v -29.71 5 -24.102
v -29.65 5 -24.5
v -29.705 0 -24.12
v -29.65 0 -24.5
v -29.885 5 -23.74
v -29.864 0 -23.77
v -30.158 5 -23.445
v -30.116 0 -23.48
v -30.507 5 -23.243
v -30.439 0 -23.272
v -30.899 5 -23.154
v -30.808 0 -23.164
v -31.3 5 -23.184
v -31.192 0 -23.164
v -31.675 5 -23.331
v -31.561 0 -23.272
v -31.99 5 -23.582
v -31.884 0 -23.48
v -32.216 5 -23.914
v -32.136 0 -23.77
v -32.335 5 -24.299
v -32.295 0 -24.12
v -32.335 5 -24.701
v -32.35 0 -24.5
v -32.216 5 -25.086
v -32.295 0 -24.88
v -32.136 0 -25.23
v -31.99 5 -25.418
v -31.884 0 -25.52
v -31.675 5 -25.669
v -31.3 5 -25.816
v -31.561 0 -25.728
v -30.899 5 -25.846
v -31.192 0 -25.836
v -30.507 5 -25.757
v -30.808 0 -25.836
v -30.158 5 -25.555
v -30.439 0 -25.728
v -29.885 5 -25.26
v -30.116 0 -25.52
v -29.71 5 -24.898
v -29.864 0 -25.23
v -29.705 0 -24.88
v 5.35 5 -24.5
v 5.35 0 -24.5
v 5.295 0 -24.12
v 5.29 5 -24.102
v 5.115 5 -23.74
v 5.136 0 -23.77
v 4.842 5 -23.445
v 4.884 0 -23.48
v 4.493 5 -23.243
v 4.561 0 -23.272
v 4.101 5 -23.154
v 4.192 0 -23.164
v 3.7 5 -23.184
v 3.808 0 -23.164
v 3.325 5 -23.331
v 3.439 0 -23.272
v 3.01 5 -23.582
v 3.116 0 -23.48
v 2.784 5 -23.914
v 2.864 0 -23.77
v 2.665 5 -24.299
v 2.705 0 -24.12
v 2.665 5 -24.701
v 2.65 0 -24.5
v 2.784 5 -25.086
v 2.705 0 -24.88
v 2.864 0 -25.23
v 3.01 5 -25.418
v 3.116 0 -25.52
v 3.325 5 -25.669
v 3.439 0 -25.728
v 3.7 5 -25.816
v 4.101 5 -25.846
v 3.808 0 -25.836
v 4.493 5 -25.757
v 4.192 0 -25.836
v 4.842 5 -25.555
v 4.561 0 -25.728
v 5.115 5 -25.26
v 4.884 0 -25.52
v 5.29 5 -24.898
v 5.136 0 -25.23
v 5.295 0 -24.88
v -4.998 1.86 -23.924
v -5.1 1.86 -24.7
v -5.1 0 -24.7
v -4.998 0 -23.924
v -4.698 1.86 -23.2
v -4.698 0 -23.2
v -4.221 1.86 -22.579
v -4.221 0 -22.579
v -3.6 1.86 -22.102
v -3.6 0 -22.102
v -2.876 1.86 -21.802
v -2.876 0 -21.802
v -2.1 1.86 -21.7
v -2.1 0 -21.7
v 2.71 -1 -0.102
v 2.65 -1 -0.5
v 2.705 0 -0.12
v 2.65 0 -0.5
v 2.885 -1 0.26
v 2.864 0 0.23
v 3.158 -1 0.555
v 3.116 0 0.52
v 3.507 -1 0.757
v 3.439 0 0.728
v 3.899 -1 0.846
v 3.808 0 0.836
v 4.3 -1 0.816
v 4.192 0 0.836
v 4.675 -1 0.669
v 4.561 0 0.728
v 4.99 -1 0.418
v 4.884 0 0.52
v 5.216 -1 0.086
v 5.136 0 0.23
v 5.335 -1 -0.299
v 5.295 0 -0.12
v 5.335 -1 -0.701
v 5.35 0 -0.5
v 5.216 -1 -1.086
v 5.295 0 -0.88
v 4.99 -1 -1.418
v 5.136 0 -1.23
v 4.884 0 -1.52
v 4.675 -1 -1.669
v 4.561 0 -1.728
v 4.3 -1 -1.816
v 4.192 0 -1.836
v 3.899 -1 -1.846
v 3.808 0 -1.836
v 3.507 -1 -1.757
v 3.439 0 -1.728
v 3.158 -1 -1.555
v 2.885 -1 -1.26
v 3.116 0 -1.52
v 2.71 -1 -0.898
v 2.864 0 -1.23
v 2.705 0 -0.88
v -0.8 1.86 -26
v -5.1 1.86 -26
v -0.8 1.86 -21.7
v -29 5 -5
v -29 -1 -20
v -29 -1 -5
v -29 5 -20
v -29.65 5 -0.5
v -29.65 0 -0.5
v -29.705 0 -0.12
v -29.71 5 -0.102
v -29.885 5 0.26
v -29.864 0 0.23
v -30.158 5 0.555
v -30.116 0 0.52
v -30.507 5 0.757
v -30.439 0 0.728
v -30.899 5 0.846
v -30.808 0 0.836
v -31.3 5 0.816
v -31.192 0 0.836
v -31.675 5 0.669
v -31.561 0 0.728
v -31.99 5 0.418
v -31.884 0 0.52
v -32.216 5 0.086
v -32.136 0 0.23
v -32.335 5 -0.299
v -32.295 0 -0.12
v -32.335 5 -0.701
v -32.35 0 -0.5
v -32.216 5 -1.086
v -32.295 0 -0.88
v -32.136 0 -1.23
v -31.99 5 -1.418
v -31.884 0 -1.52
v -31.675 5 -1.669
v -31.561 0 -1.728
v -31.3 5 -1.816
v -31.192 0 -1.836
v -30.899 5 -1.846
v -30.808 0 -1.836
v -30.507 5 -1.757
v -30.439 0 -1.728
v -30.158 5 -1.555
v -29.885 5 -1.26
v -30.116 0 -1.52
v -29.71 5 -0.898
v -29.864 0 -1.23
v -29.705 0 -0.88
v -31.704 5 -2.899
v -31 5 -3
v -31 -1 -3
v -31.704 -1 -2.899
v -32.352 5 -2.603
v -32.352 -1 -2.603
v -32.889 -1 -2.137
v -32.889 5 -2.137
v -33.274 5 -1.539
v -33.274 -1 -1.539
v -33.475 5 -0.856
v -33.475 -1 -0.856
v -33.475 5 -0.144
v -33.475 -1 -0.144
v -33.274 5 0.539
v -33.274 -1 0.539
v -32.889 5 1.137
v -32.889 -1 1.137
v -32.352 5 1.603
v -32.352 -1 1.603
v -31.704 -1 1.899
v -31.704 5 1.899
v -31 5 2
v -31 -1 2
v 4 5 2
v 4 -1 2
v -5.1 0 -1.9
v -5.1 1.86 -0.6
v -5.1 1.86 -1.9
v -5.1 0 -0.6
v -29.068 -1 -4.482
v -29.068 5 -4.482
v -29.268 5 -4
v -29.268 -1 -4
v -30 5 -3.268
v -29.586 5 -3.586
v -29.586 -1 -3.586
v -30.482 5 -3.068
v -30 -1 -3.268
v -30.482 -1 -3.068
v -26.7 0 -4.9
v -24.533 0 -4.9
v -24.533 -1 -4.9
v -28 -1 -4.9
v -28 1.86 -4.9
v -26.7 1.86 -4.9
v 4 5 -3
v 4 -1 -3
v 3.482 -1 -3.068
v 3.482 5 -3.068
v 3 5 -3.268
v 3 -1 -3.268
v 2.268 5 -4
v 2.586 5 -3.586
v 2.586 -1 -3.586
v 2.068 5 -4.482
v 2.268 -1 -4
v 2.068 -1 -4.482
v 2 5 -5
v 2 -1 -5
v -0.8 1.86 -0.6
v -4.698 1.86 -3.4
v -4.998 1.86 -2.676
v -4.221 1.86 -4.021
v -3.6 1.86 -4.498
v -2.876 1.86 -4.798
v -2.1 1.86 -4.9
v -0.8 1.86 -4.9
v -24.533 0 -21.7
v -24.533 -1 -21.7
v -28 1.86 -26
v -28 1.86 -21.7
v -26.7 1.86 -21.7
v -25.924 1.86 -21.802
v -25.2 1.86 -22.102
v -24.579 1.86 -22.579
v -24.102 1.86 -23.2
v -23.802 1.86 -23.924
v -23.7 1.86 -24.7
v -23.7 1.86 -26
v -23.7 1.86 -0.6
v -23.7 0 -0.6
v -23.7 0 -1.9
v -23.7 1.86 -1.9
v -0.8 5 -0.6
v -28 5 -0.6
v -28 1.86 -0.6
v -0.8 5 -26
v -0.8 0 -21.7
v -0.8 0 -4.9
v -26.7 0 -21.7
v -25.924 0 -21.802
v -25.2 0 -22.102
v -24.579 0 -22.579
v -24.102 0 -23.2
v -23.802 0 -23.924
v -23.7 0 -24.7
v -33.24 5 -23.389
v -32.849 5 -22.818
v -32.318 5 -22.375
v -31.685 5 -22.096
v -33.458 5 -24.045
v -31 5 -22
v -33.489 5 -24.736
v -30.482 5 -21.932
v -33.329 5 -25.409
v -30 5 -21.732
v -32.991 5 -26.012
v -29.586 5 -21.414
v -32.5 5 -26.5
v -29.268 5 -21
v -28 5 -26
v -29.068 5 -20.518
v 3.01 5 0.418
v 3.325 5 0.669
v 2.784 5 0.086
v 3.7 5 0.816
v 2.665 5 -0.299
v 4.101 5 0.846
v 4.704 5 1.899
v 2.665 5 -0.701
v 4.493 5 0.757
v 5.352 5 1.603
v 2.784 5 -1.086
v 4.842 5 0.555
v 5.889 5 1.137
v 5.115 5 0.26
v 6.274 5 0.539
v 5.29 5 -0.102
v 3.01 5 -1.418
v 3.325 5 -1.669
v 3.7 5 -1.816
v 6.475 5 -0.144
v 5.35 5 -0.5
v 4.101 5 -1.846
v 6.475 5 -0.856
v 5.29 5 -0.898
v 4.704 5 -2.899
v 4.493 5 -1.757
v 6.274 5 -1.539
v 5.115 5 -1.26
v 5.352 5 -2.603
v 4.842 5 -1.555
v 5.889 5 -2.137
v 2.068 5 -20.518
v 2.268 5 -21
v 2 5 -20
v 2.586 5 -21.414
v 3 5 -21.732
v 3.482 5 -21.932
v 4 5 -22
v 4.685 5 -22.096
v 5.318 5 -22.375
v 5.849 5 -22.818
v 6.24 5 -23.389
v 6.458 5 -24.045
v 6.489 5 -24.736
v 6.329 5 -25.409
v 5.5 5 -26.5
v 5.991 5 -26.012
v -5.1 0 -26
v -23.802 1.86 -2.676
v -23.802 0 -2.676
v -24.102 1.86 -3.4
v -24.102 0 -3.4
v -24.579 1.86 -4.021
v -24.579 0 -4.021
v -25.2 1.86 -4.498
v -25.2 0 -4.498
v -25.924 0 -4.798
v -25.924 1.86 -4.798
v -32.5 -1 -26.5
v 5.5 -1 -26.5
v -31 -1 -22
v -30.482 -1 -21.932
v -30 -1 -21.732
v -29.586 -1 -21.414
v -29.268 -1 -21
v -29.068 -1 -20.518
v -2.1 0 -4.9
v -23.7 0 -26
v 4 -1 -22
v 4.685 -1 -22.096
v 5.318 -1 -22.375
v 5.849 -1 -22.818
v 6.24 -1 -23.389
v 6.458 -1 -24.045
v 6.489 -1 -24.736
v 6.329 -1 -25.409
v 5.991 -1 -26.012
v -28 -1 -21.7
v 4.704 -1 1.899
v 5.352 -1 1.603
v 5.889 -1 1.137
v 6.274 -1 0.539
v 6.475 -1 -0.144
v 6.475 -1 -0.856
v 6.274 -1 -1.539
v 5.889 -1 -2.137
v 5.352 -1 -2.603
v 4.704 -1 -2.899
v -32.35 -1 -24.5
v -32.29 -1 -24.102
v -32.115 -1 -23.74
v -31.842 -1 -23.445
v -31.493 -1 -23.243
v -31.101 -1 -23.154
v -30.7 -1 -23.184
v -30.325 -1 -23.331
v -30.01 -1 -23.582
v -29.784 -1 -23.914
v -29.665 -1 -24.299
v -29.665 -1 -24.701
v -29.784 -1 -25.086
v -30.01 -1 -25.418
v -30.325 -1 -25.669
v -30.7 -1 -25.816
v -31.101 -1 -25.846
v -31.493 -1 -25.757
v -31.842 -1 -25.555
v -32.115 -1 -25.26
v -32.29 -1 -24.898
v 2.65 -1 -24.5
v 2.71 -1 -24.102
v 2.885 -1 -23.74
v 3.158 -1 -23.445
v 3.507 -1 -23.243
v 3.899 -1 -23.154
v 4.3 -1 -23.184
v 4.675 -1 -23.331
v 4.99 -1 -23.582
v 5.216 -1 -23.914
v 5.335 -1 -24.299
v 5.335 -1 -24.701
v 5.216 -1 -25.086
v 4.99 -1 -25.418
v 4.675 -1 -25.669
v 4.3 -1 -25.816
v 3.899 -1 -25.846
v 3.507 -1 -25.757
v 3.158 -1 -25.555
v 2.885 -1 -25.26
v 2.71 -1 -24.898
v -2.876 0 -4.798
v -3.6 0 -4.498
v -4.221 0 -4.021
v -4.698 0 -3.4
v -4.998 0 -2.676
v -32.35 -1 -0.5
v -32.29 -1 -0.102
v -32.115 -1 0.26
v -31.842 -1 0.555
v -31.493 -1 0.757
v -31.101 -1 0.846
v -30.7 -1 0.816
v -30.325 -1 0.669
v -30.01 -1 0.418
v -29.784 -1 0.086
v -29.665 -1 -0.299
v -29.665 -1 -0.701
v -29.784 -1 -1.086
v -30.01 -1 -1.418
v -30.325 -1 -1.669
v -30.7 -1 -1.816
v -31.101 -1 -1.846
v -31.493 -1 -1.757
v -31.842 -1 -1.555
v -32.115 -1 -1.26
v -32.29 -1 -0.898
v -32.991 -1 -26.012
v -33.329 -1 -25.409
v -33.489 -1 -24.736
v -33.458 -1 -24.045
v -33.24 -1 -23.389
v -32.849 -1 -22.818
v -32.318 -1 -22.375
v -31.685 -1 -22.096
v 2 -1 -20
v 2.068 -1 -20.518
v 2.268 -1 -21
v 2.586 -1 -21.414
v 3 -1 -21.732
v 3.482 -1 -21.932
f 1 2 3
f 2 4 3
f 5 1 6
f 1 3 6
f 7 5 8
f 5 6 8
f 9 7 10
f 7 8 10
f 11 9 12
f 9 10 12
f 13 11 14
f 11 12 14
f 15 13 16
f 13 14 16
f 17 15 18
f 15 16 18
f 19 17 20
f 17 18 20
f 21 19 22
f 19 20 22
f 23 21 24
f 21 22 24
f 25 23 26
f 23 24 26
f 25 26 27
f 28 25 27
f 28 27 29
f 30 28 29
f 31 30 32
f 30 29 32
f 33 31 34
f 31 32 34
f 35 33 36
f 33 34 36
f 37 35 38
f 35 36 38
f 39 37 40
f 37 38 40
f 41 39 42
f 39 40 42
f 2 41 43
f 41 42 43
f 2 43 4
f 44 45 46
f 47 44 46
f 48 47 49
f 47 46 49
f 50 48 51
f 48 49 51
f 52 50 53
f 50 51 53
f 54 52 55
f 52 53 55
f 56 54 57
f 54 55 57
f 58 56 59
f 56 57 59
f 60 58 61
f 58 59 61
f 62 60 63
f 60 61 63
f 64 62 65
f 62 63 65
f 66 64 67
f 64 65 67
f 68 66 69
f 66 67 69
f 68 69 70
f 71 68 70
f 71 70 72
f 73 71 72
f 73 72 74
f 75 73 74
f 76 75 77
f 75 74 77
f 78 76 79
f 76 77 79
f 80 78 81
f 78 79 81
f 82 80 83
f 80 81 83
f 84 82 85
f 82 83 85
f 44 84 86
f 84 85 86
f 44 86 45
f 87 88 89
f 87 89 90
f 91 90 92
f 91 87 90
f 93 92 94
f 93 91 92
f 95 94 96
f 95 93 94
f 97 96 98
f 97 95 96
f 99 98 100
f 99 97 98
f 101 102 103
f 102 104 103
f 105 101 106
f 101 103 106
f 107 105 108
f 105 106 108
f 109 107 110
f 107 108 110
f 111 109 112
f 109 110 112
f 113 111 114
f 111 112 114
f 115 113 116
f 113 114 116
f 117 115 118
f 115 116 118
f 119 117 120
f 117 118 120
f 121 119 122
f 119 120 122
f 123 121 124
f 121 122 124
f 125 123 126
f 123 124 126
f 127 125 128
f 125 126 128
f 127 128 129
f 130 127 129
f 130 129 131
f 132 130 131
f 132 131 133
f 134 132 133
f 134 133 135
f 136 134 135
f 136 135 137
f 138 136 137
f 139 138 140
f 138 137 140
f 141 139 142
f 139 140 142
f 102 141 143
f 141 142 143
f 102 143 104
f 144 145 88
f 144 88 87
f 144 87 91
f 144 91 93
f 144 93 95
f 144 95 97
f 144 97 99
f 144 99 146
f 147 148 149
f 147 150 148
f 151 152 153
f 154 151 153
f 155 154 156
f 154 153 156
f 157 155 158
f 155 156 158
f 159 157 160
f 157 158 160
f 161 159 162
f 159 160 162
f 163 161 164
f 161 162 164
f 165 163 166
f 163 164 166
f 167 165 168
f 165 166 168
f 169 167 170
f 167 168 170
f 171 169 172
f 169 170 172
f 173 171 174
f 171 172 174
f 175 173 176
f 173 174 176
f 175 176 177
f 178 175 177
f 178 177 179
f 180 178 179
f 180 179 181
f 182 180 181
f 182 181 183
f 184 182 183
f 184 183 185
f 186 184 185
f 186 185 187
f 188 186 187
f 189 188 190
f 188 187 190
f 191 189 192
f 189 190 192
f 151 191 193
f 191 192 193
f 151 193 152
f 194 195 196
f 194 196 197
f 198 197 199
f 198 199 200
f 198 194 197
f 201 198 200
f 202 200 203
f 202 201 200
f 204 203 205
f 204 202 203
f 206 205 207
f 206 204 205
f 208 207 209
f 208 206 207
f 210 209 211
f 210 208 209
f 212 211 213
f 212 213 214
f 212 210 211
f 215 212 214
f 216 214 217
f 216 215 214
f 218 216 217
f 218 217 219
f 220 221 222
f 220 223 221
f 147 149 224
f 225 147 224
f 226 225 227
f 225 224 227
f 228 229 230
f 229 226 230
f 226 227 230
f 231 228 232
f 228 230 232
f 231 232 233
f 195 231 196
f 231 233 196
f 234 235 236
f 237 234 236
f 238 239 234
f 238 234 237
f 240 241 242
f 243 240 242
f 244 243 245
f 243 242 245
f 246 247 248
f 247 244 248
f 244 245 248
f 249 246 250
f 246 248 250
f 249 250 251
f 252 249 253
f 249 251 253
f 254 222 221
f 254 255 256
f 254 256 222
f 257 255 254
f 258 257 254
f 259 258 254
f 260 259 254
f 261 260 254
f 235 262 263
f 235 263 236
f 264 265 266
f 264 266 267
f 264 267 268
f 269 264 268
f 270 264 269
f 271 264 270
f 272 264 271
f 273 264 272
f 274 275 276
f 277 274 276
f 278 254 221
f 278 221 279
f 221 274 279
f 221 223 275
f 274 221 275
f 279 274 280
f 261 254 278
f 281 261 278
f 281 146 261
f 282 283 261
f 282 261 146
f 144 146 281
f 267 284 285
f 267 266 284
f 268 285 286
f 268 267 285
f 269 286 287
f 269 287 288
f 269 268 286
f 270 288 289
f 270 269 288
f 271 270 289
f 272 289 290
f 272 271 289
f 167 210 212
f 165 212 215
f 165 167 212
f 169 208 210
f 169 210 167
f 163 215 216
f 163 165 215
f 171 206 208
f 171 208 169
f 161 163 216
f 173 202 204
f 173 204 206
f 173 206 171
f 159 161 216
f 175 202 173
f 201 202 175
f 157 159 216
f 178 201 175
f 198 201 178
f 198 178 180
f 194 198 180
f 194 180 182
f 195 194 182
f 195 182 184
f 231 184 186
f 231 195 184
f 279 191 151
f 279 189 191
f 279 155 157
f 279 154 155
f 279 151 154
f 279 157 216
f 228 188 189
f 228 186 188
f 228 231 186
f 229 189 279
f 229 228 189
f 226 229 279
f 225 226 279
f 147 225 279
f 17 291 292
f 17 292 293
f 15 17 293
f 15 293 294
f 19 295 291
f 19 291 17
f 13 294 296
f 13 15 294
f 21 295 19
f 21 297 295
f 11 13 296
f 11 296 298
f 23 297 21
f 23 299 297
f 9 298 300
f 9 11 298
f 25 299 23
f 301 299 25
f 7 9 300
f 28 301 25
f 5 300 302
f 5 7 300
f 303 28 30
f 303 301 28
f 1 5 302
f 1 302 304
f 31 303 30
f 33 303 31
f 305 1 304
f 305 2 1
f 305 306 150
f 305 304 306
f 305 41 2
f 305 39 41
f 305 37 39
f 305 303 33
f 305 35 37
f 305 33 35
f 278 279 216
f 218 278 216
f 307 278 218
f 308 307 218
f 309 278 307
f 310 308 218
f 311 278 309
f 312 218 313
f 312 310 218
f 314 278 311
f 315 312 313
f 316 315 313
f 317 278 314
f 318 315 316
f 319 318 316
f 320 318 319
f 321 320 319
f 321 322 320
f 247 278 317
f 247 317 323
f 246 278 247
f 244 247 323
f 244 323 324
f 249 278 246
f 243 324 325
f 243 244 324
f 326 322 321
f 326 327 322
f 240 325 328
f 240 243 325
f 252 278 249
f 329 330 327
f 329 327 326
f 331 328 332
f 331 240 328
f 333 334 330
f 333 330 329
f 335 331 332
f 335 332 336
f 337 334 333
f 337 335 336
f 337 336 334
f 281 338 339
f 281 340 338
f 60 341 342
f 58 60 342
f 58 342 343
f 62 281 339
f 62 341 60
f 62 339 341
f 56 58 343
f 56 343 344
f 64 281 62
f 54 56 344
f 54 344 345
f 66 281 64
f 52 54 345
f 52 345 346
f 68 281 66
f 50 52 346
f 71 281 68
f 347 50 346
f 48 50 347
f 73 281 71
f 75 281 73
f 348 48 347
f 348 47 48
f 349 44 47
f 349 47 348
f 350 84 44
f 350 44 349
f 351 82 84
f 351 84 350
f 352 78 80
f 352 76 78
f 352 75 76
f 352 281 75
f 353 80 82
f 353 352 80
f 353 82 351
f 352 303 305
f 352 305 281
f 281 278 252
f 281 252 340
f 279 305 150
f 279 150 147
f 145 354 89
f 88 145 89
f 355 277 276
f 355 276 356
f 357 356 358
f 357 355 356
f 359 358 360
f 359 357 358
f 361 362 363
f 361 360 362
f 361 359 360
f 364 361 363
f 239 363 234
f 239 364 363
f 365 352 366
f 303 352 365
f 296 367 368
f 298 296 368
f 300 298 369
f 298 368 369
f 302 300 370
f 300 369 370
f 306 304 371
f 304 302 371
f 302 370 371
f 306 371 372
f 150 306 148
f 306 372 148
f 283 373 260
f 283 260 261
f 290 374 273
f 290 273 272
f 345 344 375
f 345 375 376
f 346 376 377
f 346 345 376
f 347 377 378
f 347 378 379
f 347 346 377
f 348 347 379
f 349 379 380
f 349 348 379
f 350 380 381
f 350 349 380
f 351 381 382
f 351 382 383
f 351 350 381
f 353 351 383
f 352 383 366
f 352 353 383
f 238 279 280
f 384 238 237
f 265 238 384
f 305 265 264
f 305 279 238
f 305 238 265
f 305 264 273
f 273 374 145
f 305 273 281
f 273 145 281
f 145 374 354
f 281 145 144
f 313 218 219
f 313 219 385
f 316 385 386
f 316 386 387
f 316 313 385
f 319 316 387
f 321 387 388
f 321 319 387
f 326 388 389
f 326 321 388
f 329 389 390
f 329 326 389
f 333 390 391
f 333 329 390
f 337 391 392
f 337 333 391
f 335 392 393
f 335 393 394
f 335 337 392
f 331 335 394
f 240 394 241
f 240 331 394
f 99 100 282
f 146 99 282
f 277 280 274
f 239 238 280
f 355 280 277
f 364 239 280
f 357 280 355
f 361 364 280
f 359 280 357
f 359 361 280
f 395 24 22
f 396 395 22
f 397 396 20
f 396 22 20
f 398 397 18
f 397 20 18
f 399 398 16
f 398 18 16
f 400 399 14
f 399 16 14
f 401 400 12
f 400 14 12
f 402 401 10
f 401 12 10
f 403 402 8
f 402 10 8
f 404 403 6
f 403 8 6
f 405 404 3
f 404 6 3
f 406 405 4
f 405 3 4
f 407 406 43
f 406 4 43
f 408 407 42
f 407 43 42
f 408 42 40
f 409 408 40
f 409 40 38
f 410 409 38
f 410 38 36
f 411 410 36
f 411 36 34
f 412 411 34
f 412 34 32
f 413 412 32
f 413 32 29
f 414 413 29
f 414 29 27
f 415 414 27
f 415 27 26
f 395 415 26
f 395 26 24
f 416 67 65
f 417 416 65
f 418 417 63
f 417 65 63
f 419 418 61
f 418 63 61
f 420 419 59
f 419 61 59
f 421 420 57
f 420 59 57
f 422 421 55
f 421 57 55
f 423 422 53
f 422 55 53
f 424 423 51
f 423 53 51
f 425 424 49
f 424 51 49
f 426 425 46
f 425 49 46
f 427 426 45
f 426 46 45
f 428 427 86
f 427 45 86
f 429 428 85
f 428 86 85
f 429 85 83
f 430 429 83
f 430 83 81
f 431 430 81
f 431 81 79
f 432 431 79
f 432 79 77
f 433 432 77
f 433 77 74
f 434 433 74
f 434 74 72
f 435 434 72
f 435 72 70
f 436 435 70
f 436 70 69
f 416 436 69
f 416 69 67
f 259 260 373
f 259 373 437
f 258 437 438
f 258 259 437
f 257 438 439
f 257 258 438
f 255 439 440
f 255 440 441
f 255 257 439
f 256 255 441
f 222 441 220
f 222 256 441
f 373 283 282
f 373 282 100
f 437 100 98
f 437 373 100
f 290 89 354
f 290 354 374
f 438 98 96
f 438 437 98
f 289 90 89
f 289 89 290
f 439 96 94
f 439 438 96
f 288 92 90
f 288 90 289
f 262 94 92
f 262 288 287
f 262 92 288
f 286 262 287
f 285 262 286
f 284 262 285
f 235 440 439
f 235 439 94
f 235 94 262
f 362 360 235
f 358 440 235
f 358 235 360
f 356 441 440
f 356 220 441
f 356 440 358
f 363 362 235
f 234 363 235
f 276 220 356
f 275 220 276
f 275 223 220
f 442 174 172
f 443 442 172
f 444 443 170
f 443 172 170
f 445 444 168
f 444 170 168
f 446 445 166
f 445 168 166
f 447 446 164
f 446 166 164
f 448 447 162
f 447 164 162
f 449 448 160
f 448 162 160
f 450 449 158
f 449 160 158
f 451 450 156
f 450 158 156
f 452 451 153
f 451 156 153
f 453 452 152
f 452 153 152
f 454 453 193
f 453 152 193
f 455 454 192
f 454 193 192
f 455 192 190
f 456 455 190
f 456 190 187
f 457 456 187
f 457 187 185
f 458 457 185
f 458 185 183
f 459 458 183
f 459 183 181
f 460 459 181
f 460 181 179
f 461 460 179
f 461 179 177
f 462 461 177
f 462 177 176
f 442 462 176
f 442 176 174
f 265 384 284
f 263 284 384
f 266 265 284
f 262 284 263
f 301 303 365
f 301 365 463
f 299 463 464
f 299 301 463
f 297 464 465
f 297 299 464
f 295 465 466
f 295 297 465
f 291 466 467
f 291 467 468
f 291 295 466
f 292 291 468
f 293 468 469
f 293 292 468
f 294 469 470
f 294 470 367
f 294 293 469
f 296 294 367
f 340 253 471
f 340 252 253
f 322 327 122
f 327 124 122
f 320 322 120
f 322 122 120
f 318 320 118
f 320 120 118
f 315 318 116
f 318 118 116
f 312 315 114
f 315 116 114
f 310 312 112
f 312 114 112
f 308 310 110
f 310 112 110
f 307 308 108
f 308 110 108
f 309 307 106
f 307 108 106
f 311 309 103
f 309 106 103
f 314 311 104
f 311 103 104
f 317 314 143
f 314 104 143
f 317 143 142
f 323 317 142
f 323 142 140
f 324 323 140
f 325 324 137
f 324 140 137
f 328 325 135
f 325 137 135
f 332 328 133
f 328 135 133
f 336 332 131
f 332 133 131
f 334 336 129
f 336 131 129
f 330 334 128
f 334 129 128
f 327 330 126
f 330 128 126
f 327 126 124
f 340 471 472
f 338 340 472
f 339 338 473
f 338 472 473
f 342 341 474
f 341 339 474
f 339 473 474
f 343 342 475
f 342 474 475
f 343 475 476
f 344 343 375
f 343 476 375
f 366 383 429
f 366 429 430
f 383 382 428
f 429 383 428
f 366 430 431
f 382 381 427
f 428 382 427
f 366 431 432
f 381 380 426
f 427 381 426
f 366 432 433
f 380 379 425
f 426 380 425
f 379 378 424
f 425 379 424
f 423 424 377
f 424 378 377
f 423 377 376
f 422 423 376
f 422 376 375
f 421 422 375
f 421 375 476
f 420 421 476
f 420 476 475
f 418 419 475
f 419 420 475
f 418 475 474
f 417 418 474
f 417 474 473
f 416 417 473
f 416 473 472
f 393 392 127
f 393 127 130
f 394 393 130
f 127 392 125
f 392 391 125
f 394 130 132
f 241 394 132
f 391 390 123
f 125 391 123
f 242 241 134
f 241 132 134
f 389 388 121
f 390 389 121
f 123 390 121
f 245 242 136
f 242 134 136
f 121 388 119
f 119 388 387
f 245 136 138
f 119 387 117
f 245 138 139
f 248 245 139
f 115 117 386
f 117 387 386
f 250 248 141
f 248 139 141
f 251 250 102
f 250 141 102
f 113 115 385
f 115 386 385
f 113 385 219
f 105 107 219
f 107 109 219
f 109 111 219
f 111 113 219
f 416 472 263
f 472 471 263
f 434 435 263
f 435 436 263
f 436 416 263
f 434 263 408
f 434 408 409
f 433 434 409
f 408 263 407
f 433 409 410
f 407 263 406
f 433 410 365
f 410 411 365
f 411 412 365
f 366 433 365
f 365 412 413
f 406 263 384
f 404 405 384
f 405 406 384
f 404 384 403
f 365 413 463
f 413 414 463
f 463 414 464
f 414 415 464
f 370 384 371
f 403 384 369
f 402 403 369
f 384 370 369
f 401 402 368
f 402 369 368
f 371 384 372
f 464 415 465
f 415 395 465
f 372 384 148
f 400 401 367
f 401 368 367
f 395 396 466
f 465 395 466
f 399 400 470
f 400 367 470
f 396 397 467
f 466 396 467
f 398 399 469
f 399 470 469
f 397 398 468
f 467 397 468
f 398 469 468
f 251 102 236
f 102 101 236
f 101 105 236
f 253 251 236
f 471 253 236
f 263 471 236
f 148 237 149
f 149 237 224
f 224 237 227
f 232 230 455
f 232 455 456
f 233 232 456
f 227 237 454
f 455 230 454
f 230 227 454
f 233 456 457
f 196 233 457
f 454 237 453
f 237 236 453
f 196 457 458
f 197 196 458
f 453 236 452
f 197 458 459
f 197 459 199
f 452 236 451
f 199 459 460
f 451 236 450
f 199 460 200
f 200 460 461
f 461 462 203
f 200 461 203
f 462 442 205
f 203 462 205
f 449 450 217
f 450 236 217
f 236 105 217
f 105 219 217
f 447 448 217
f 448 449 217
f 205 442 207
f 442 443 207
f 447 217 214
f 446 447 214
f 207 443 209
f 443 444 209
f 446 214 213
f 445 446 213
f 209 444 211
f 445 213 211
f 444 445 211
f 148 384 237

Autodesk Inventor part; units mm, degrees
ref_plane "YZ Plane" through (0, 0, 0) normal (1, 0, 0) x (0, 1, 0)
ref_plane "XZ Plane" through (0, 0, 0) normal (0, 1, 0) x (-1, 0, 0)
ref_plane "XY Plane" through (0, 0, 0) normal (0, 0, 1) x (1, 0, 0)
sketch "Sketch1" plane through (0, 0, 0) normal (0, 1, 0) x (-1, 0, 0)
  line L0 (0, 0) -> (27, 0) construction
  line L1 (27, 0) -> (27, -25) construction
  line L2 (27, -25) -> (0, -25) construction
  line L3 (0, -25) -> (0, 0) construction
  line L4 (31, 2) -> (-4, 2)
  line L5 (-4, -27) -> (31, -27)
  line L6 (29, -22) -> (29, -3)
  line L7 (28, -4) -> (23.5, -4)
  line L8 (23.5, -4) -> (23.5, -21)
  line L9 (23.5, -21) -> (28, -21)
  line L10 (28, -21) -> (28, -4)
  arc A0 (31, -3) -> (31, 2) centre (31, -0.5) ccw
  arc A1 (31, -27) -> (31, -22) centre (31, -24.5) ccw
  arc A2 (-4, 2) -> (-4, -3) centre (-4, -0.5) ccw
  arc A3 (-4, -22) -> (-4, -27) centre (-4, -24.5) ccw
  line L11 (31, -3) -> (29, -3)
  line L12 (31, -22) -> (29, -22)
  line L13 (-4, -3) -> (-2, -3)
  line L14 (-4, -22) -> (-2, -22)
  line L15 (-2, -3) -> (-2, -22)
  circle A4 centre (31, -0.5) radius 1.35
  circle A5 centre (31, -24.5) radius 1.35
  circle A6 centre (-4, -0.5) radius 1.35
  circle A7 centre (-4, -24.5) radius 1.35
  point P0 (29, 2)
  point P1 (-2, -27)
  point P2 (-2, 2)
  point P3 (29, -27)
  dimension "d0" = 27
  dimension "d1" = 25
  dimension "d12" = 2
  dimension "d13" = 2
  dimension "d14" = 2
  dimension "d18" = 1
  dimension "d19" = 3.5
  dimension "d20" = 6
  dimension "d21" = 6
  dimension "d22" = 5
  dimension "d23" = 2.5
  dimension "d24" = 2
  dimension "d25" = 2.5
  dimension "d26" = 2
  dimension "d27" = 5
  dimension "d28" = 5
  dimension "d29" = 5
  dimension "d32" = 2.5
  dimension "d33" = 2.5
  dimension "d34" = 2.7
  dimension "d35" = 2.7
  dimension "d36" = 2.7
  dimension "d37" = 2.7
extrude "Extrusion1" add sketch "Sketch1" against normal blind 1
sketch "Sketch2" plane through (0, 0, 0) normal (0, 1, 0) x (1, 0, 0)
  line L0 (-31, -2) -> (4, -2) projected
  arc A0 (4, -2) -> (4, 3) centre (4, 0.5) ccw projected
  line L1 (4, 3) -> (2, 3) projected
  line L2 (2, 3) -> (2, 22) projected
  line L3 (2, 22) -> (4, 22) projected
  arc A1 (4, 22) -> (4, 27) centre (4, 24.5) ccw projected
  line L4 (4, 27) -> (-31, 27) projected
  arc A2 (-31, 27) -> (-31, 22) centre (-31, 24.5) ccw projected
  line L5 (-31, 22) -> (-29, 22) projected
  line L6 (-29, 22) -> (-29, 3) projected
  line L7 (-29, 3) -> (-31, 3) projected
  arc A3 (-31, 3) -> (-31, -2) centre (-31, 0.5) ccw projected
  circle A4 centre (4, 24.5) radius 1.35 projected
  circle A5 centre (4, 0.5) radius 1.35 projected
  circle A6 centre (-31, 24.5) radius 1.35 projected
  circle A7 centre (-31, 0.5) radius 1.35 projected
  line L8 (-28, 4) -> (-28, 21) projected
  line L9 (-28, 21) -> (-23.5, 21) projected
  line L10 (-23.5, 21) -> (-23.5, 4) projected
  line L11 (-23.5, 4) -> (-28, 4) projected
  line L12 (-28, 26) -> (1, 26)
  line L13 (1, 26) -> (1, -1)
  line L14 (1, -1) -> (-28, -1)
  line L15 (-28, -1) -> (-28, 26)
  point P0 (0, 0)
  dimension "d38" = 1
  dimension "d39" = 1
  dimension "d40" = 1
  dimension "d41" = 1
extrude "Extrusion2" add sketch "Sketch2" along normal blind 5
fillet "Fillet1" radius 2 4 edges at (2, 2, -3) (2, 2, -22) (-29, 2, -22) (-29, 2, -3)
sketch "Sketch4" plane through (0, 5, 0) normal (0, 1, 0) x (1, 0, 0)
  line L0 (-36.8851, 35.5263) -> (12.4576, 35.5263)
  line L1 (12.4576, 35.5263) -> (12.4576, 26.5)
  line L2 (12.4576, 26.5) -> (-36.8851, 26.5)
  line L3 (-36.8851, 26.5) -> (-36.8851, 35.5263)
  line L4 (4, 27) -> (-31, 27) projected
  point P0 (0, 0)
  dimension "d47" = 0.5
extrude "Extrusion3" cut sketch "Sketch4" against normal blind 10
sketch "Sketch5" plane through (0, 0, 0) normal (0, 1, 0) x (1, 0, 0)
  line L0 (1, -1) -> (-28, -1) projected
  line L1 (-28, -1) -> (1, -1)
  line L2 (1, -1) -> (1, 0.6)
  line L3 (1, 0.6) -> (-28, 0.6)
  line L4 (-28, 0.6) -> (-28, -1)
  line L5 (1, 26) -> (1, -1) projected
  line L6 (1, 26) -> (-28, 26) projected
  line L7 (1, -1) -> (-0.8, -1)
  line L8 (-0.8, -1) -> (-0.8, 26)
  line L9 (-0.8, 26) -> (1, 26)
  line L10 (1, 26) -> (1, -1)
  point P0 (0, 0)
  point P1 (-0.8, 0.6)
  dimension "d50" = 1.6
  dimension "d57" = 1.8
extrude "Extrusion4" add sketch "Sketch5" along normal up to surface (5 mm away)
sketch "Sketch6" plane through (0, -1, 0) normal (0, -1, 0) x (1, 0, 0)
  line L0 (-23.5, -4) -> (-28, -4) projected
  line L1 (-28, -0.6) -> (-28, -26) projected
  line L2 (-23.5, -4) -> (-28, -4)
  line L3 (-28, -4) -> (-28, -8)
  line L4 (-28, -8) -> (-23.5, -8)
  line L5 (-23.5, -8) -> (-23.5, -4)
  line L6 (-28, -21) -> (-23.5, -21) projected
  line L7 (-23.5, -4) -> (-25.6, -4)
  line L8 (-25.6, -4) -> (-25.6, -21)
  line L9 (-25.6, -21) -> (-23.5, -21)
  line L10 (-23.5, -21) -> (-23.5, -4)
  point P0 (0, 0)
  point P1 (-25.6, -8)
  dimension "d53" = 4
  dimension "d54" = 2.4
extrude "Extrusion5" add sketch "Sketch6" against normal up to surface (1 mm away) contours L5 L4 L8 L0 | L8 L4 L1 L0 | L10 L6 L8 L4
sketch "Sketch7" plane through (0, 0, 0) normal (0, 1, 0) x (1, 0, 0)
  line L0 (-28, 0.6) -> (-0.8, 0.6) projected
  line L1 (-0.8, 0.6) -> (-5.1, 0.6)
  line L2 (-5.1, 0.6) -> (-5.1, 4.9)
  line L3 (-5.1, 4.9) -> (-0.8, 4.9)
  line L4 (-0.8, 4.9) -> (-0.8, 0.6)
  line L5 (-28, 0.6) -> (-23.7, 0.6)
  line L6 (-23.7, 0.6) -> (-23.7, 4.9)
  line L7 (-23.7, 4.9) -> (-28, 4.9)
  line L8 (-28, 4.9) -> (-28, 0.6)
  line L9 (-28, 26) -> (-0.8, 26) projected
  line L10 (-28, 26) -> (-23.7, 26)
  line L11 (-23.7, 26) -> (-23.7, 21.7)
  line L12 (-23.7, 21.7) -> (-28, 21.7)
  line L13 (-28, 21.7) -> (-28, 26)
  line L14 (-0.8, 26) -> (-5.1, 26)
  line L15 (-5.1, 26) -> (-5.1, 21.7)
  line L16 (-5.1, 21.7) -> (-0.8, 21.7)
  line L17 (-0.8, 21.7) -> (-0.8, 26)
  point P0 (0, 0)
  point P1 (-0.8, 26)
  dimension "d58" = 4.3
  dimension "d59" = 4.3
  dimension "d60" = 4.3
  dimension "d61" = 4.3
  dimension "d62" = 4.3
  dimension "d63" = 4.3
extrude "Extrusion6" add sketch "Sketch7" along normal blind 1.86
fillet "Fillet2" radius 3 4 edges at (-23.7, 0.93, -21.7) (-23.7, 0.93, -4.9) (-5.1, 0.93, -21.7) (-5.1, 0.93, -4.9)
sketch "Sketch8" plane through (0, 0, 0) normal (0, 1, 0) x (1, 0, 0)
  line L0 (-28, 21.7) -> (-28, 26) projected
  line L1 (-28, 21.7) -> (-24.5334, 21.7)
  line L2 (-24.5334, 21.7) -> (-24.5334, 4.9)
  line L3 (-24.5334, 4.9) -> (-28, 4.9)
  line L4 (-28, 4.9) -> (-28, 21.7)
  point P0 (0, 0)
extrude "Extrusion7" cut sketch "Sketch8" against normal blind 10
equation "\"d13\" = d12"
equation "\"d14\" = d12"
equation "\"d15\" = d12"
properties part number "OledModBase"
